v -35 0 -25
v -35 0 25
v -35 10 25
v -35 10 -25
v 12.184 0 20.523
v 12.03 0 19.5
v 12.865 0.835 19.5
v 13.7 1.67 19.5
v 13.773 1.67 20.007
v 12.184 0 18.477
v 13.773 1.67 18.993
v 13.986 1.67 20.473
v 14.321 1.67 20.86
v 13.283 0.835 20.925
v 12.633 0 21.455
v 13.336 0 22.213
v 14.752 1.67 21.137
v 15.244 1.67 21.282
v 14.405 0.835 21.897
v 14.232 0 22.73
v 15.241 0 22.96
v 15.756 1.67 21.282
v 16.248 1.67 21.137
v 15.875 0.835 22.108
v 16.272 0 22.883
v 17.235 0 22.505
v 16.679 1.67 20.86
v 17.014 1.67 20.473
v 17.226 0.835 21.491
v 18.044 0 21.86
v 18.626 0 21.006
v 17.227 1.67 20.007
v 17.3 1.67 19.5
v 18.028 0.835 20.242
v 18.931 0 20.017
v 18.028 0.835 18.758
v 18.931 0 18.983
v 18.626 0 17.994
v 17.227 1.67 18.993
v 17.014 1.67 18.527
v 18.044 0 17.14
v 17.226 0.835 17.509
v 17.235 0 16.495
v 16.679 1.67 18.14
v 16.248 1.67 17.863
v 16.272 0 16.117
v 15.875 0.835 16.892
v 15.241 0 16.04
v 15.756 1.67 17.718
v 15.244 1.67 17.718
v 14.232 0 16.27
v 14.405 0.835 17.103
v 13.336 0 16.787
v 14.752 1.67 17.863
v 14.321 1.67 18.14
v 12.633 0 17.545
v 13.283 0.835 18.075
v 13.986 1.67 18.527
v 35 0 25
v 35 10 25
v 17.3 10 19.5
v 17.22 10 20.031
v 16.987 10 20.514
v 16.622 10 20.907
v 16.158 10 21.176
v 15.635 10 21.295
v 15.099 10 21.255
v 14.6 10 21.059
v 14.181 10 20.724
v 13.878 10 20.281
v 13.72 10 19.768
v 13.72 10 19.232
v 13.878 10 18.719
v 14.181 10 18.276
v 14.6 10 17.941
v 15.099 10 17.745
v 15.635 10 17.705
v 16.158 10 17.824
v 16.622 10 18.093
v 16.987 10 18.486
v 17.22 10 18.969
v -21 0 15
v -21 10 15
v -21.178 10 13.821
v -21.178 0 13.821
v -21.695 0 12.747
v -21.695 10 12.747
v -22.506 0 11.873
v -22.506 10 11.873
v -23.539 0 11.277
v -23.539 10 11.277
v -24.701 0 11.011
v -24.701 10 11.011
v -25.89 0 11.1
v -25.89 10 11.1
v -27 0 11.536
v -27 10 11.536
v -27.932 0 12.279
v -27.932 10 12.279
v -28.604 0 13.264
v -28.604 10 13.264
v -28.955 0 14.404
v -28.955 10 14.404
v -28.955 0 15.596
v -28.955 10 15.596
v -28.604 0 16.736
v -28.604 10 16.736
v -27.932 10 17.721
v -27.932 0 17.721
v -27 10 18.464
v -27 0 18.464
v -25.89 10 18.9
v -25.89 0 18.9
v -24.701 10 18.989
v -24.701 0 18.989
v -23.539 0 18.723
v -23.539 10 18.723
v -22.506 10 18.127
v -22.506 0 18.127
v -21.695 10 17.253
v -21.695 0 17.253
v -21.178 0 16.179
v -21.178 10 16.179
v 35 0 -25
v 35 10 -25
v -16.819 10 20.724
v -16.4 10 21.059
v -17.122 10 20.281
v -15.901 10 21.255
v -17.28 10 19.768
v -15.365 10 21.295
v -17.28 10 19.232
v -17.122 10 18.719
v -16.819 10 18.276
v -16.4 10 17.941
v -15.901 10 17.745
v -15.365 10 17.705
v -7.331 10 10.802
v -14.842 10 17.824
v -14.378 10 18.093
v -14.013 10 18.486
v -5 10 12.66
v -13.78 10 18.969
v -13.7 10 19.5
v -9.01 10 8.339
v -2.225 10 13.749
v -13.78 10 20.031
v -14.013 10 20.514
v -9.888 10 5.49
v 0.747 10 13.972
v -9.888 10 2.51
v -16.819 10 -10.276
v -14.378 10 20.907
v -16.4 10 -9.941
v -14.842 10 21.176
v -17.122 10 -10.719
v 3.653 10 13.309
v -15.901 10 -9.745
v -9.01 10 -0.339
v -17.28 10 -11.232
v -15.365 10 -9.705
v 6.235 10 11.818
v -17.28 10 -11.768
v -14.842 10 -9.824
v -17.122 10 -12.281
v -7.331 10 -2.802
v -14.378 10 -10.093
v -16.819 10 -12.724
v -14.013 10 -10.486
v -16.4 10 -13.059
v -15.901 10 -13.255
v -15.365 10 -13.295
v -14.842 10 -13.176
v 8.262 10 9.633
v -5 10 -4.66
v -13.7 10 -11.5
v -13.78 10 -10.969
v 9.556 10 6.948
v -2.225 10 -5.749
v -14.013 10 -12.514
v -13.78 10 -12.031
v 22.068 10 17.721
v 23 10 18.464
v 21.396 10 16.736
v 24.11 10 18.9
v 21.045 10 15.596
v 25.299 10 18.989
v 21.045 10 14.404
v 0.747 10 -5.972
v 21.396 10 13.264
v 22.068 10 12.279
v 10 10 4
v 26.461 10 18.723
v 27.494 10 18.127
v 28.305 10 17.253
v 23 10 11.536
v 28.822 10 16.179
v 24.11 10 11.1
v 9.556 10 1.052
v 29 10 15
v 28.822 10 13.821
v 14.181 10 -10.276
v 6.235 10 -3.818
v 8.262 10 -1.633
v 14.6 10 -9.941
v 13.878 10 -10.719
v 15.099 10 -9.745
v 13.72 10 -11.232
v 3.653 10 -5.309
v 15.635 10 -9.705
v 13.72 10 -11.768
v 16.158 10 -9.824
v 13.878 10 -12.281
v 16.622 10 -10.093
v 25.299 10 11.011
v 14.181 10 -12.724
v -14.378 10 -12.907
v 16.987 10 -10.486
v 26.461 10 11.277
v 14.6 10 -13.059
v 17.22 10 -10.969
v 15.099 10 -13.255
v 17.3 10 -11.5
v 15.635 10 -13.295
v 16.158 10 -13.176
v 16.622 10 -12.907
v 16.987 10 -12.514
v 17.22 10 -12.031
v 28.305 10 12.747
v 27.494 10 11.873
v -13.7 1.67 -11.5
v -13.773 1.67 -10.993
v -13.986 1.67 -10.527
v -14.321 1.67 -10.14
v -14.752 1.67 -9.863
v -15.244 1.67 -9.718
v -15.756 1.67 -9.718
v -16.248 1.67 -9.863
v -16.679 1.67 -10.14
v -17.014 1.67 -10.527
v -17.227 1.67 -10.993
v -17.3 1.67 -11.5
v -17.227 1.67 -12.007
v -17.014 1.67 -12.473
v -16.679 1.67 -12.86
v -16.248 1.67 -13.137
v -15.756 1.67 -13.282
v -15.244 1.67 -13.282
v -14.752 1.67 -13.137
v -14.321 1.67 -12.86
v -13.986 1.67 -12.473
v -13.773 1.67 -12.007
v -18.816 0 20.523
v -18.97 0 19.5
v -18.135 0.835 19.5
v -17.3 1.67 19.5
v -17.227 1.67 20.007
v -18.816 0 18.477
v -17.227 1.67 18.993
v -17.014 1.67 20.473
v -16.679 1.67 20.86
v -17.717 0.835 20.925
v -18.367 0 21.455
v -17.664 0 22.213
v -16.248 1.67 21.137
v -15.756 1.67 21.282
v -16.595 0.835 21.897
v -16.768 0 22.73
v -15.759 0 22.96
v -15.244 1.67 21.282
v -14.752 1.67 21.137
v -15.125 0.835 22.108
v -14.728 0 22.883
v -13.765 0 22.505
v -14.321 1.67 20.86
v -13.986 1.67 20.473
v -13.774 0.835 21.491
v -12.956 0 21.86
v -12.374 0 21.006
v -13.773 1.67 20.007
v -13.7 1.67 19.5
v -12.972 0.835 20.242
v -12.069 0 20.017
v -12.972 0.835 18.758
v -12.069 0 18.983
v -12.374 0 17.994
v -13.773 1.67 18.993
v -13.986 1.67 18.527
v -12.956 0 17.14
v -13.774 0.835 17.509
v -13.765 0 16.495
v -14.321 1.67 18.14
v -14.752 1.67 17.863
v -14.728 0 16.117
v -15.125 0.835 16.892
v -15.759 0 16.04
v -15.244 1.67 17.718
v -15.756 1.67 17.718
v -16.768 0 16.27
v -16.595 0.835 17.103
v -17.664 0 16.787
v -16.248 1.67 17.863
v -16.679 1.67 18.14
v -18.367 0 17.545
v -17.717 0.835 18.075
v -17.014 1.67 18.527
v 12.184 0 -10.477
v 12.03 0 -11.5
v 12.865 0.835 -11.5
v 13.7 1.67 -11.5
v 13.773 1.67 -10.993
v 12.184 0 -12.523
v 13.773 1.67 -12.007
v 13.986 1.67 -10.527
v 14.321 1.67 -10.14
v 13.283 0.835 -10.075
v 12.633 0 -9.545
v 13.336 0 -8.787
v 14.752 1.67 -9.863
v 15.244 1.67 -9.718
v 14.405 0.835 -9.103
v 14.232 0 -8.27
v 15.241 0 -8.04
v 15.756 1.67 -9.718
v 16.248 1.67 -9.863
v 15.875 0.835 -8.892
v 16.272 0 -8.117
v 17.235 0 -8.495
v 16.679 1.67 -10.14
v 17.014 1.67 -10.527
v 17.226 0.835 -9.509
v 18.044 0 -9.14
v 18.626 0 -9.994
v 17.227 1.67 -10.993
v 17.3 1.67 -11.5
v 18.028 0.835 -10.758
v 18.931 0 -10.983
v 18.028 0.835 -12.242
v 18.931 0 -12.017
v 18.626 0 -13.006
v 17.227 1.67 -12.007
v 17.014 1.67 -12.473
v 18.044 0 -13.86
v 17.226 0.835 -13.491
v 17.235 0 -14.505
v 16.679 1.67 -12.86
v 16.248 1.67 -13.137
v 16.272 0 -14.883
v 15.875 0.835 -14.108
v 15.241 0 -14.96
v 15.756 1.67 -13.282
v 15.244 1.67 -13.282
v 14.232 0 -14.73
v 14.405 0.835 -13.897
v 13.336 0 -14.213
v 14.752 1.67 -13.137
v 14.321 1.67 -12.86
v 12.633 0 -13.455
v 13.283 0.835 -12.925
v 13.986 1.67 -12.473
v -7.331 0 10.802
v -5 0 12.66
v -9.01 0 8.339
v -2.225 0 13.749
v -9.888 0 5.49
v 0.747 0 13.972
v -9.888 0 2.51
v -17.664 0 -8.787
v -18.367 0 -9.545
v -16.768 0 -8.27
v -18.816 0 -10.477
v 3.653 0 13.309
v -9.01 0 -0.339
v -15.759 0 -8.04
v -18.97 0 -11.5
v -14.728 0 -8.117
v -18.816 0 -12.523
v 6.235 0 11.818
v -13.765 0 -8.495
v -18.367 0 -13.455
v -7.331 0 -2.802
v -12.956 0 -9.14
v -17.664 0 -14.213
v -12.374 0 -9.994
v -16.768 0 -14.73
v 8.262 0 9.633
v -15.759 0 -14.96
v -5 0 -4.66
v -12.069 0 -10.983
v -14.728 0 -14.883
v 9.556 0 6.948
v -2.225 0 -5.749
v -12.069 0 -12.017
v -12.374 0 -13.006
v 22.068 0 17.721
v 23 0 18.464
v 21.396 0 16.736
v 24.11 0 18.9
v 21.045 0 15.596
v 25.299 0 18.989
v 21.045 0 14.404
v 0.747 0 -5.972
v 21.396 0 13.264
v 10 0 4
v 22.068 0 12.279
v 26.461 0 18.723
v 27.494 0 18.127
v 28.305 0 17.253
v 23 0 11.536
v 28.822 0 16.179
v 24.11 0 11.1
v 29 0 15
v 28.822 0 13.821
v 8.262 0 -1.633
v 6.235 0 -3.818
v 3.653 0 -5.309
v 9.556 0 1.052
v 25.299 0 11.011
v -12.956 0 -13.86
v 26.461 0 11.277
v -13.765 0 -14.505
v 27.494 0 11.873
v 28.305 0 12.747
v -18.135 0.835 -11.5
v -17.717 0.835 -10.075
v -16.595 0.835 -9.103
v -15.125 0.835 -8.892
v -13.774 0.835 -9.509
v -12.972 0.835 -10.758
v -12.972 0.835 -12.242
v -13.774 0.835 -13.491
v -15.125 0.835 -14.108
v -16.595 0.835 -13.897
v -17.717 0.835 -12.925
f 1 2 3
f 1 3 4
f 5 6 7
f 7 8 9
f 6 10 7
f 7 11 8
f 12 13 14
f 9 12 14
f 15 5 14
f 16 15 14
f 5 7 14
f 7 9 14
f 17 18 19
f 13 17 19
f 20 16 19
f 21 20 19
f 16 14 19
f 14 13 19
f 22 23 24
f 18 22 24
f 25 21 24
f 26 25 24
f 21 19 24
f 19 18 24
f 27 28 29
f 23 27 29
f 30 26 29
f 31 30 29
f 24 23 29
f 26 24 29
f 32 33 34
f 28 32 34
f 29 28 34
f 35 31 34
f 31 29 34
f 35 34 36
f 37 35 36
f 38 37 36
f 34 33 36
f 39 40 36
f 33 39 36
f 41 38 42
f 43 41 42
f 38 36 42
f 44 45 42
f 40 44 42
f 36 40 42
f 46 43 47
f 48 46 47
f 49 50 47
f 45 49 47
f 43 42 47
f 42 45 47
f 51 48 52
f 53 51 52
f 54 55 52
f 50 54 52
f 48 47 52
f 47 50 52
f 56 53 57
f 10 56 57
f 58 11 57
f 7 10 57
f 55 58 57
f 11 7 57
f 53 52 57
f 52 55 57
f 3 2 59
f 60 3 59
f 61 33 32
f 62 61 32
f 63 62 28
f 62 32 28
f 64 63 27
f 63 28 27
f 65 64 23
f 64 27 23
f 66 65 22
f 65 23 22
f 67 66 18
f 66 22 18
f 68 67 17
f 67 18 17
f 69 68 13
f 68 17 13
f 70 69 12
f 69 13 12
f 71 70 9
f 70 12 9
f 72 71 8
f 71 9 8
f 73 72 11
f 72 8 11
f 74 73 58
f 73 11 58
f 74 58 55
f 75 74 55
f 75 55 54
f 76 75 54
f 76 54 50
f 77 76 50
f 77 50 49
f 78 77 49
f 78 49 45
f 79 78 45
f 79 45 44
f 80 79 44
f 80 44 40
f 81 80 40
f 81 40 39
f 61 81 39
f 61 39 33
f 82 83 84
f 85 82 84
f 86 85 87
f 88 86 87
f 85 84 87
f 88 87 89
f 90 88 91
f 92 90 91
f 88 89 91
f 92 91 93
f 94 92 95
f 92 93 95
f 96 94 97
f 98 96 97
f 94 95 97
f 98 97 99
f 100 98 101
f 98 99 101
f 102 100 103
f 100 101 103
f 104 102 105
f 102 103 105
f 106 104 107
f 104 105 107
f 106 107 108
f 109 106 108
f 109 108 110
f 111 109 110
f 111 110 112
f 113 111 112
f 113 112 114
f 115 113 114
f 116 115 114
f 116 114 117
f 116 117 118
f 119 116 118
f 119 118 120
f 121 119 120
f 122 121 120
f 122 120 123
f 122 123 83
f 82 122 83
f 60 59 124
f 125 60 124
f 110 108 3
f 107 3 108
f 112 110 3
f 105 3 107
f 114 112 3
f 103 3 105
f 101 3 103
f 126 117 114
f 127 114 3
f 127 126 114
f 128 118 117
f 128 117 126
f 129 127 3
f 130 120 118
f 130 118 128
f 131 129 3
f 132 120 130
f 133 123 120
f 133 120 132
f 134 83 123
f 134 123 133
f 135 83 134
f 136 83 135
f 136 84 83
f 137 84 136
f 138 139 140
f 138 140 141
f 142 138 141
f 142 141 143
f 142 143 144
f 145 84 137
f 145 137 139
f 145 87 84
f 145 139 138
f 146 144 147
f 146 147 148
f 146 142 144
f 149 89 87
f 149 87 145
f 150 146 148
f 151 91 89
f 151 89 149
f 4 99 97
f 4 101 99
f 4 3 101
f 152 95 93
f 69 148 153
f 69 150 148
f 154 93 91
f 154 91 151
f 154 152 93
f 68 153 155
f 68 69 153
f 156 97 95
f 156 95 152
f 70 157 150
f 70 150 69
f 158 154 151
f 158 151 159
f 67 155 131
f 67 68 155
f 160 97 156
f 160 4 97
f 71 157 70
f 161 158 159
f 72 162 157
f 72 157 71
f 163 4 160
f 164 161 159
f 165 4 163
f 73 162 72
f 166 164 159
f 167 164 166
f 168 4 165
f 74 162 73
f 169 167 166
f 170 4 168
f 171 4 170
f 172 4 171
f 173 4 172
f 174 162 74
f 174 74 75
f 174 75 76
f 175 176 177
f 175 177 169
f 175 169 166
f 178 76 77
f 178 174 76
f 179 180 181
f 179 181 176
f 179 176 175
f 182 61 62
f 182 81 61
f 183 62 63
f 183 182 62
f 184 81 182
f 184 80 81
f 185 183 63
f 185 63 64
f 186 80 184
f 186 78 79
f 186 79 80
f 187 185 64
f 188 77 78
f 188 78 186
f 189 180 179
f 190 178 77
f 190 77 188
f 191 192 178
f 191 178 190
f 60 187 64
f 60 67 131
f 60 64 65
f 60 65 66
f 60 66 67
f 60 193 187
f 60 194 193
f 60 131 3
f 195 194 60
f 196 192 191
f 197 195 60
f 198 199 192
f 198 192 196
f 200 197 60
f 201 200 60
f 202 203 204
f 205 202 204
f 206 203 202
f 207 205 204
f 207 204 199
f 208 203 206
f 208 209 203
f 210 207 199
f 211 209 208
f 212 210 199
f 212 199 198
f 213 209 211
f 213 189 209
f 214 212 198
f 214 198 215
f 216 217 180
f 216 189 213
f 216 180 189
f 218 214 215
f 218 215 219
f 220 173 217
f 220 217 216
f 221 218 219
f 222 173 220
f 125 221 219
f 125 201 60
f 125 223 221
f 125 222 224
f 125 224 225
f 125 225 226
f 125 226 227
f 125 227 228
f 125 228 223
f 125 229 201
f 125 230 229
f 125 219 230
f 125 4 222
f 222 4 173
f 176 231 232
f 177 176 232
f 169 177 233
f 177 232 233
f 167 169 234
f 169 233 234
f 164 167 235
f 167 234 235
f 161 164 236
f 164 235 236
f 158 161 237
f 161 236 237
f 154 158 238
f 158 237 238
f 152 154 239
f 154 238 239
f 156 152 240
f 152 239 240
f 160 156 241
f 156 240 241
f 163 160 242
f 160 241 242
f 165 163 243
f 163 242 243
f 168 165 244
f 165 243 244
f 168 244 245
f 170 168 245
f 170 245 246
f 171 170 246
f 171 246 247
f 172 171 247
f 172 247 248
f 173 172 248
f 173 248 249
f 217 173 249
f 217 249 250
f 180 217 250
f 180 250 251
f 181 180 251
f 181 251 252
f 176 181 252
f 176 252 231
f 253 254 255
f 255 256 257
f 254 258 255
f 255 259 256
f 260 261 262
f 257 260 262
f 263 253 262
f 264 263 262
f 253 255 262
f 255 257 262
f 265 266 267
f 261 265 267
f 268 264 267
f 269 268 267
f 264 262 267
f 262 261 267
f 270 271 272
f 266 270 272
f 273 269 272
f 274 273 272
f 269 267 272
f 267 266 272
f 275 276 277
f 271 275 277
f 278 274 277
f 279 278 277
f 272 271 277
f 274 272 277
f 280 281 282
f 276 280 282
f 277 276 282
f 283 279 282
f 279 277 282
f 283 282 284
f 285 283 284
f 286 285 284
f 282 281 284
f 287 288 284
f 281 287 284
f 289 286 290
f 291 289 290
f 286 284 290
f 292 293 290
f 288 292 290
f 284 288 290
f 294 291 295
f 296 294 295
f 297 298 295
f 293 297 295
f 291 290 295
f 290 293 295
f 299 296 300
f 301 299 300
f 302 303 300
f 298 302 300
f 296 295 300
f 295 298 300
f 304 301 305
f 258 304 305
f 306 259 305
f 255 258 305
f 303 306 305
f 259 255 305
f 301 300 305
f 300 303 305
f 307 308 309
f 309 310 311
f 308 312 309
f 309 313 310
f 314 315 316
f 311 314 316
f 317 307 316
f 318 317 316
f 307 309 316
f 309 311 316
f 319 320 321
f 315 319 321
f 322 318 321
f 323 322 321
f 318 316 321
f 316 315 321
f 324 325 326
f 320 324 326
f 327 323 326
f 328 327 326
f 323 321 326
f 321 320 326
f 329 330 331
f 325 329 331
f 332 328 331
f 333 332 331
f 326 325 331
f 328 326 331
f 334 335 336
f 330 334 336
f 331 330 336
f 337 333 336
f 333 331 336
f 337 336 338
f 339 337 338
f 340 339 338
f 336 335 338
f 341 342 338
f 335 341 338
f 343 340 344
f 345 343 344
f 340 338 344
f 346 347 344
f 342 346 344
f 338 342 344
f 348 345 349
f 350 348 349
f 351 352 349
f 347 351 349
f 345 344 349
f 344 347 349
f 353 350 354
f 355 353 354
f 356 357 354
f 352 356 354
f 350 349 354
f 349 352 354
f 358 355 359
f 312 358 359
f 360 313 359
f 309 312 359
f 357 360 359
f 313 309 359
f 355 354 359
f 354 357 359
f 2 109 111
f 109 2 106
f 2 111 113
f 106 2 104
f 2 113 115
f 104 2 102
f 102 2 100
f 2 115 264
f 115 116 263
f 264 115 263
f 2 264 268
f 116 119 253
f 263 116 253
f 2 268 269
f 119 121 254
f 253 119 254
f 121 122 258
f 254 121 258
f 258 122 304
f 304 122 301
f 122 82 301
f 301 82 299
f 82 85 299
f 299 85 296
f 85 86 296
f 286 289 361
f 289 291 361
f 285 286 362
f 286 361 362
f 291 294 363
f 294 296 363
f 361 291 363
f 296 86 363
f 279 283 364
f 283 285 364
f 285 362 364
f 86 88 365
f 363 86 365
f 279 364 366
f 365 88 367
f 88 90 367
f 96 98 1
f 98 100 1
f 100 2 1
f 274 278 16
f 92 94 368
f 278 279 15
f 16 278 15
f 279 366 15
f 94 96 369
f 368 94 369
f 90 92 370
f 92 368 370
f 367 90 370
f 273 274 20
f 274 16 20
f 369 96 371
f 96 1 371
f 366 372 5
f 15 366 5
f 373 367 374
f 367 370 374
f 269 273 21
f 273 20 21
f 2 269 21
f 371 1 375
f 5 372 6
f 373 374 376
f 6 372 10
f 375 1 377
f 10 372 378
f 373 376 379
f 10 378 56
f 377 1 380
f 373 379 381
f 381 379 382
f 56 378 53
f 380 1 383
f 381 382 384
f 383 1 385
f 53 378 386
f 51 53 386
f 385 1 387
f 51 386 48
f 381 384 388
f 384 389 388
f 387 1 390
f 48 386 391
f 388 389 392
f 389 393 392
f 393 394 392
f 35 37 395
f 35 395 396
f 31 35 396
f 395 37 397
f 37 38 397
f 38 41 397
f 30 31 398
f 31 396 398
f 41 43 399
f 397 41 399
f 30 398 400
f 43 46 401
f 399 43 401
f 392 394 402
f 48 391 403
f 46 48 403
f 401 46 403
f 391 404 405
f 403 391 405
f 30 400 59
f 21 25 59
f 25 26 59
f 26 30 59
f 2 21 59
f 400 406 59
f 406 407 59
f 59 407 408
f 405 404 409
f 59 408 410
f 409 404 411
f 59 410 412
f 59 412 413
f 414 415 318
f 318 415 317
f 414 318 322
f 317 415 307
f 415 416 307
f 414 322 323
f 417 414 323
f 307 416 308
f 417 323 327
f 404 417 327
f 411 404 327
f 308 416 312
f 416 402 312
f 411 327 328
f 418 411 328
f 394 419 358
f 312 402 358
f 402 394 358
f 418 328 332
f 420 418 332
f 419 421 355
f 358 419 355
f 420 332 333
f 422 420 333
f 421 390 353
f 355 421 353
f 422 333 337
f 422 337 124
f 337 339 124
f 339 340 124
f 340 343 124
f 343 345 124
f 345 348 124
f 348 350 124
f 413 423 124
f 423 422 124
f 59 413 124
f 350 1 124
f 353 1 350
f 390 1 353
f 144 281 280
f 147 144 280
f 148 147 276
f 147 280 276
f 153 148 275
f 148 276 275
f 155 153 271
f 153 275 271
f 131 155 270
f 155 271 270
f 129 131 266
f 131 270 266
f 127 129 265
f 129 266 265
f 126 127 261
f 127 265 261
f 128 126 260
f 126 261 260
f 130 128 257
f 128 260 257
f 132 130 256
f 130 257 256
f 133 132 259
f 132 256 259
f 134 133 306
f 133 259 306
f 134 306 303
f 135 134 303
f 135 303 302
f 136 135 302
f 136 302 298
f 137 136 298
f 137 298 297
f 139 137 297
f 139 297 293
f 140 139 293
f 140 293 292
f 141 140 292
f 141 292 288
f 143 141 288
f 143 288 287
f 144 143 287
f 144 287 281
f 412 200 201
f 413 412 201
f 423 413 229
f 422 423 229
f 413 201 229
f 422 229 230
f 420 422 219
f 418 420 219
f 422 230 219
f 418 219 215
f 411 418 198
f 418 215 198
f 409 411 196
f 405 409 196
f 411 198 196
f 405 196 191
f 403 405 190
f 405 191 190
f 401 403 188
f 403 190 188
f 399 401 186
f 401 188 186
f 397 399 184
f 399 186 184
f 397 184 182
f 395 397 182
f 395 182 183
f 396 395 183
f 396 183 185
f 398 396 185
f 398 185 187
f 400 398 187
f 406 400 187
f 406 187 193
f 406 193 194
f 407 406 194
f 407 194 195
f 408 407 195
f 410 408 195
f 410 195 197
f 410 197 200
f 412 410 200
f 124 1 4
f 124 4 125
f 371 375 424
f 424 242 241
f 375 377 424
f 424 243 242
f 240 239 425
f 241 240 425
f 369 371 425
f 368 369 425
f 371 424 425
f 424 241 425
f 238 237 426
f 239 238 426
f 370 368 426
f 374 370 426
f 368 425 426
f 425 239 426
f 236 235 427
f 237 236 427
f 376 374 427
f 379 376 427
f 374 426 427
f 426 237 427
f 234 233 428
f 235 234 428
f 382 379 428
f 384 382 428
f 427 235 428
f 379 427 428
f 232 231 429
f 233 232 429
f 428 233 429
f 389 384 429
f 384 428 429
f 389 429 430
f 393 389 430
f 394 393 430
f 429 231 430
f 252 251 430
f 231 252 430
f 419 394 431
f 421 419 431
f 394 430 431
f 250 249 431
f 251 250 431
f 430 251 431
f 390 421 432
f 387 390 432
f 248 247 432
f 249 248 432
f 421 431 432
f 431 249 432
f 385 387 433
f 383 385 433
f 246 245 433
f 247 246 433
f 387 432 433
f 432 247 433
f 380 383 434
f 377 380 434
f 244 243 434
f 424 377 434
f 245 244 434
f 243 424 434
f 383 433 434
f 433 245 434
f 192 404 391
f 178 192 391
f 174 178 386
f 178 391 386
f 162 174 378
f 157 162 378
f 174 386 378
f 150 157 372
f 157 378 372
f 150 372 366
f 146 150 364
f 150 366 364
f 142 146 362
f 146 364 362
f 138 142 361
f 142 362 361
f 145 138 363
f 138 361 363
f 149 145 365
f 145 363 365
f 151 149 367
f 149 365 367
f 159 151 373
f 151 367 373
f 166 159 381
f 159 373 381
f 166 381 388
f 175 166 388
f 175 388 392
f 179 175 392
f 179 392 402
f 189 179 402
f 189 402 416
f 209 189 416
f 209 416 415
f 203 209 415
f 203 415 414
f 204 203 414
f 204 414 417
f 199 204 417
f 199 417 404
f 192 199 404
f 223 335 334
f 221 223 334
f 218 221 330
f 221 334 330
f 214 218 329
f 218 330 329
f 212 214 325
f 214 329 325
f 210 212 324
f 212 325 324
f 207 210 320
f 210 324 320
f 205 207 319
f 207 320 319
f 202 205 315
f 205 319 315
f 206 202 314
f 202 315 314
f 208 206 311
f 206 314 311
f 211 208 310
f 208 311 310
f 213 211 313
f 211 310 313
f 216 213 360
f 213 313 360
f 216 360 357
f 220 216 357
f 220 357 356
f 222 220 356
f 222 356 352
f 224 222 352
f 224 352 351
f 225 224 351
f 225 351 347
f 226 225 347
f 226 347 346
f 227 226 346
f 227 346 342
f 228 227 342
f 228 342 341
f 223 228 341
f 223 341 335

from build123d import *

# Parameters (mm, degrees)
SKETCH2_W                                            = 70
SKETCH2_H                                            = 50
BOSS_EXTRUDE1_DEPTH                                  = 10
SKETCH3_R                                            = 4
CUT_EXTRUDE1_DEPTH                                   = 11
SKETCH4_R                                            = 1.8
CUT_EXTRUDE2_DEPTH                                   = 11
SKETCH5_R                                            = 10
CUT_EXTRUDE3_DEPTH                                   = 11
CSK_FOR_M3_SOCKET_COUNTERSUNK_HEAD_SCREW_D           = 3.4
CSK_FOR_M3_SOCKET_COUNTERSUNK_HEAD_SCREW_CSINK_D     = 6.94
CSK_FOR_M3_SOCKET_COUNTERSUNK_HEAD_SCREW_CSINK_ANGLE = 90


with BuildPart() as part:
    # Sketch2 → Boss-Extrude1 (new body)
    with BuildSketch(Plane(origin=(0, 0, 0), x_dir=(1, 0, 0), z_dir=(0, 1, 0))):
        Rectangle(SKETCH2_W, SKETCH2_H)
    extrude(amount=BOSS_EXTRUDE1_DEPTH)

    # Sketch3 → Cut-Extrude1 (cut, through all)
    with BuildSketch(Plane(origin=(0, 10, 0), x_dir=(1, 0, 0), z_dir=(0, 1, 0))):
        with Locations((-25, -15)):
            Circle(SKETCH3_R)
        with Locations((25, -15)):
            Circle(SKETCH3_R)
    extrude(amount=-CUT_EXTRUDE1_DEPTH, mode=Mode.SUBTRACT)

    # Sketch4 → Cut-Extrude2 (cut, through all)
    with BuildSketch(Plane.XZ):
        with Locations((-15.5, 19.5)):
            Circle(SKETCH4_R)
        with Locations((-15.5, -11.5)):
            Circle(SKETCH4_R)
        with Locations((15.5, -11.5)):
            Circle(SKETCH4_R)
        with Locations((15.5, 19.5)):
            Circle(SKETCH4_R)
    extrude(amount=-CUT_EXTRUDE2_DEPTH, mode=Mode.SUBTRACT)

    # Sketch5 → Cut-Extrude3 (cut, through all)
    with BuildSketch(Plane.XZ):
        with Locations((0, 4)):
            Circle(SKETCH5_R)
    extrude(amount=-CUT_EXTRUDE3_DEPTH, mode=Mode.SUBTRACT)

    # CSK for M3 socket countersunk head screw (through all)
    with Locations(Plane.XZ):
        with Locations((-15.5, 19.5), (15.5, 19.5), (15.5, -11.5), (-15.5, -11.5)):
            CounterSinkHole(CSK_FOR_M3_SOCKET_COUNTERSUNK_HEAD_SCREW_D / 2, CSK_FOR_M3_SOCKET_COUNTERSUNK_HEAD_SCREW_CSINK_D / 2, counter_sink_angle=CSK_FOR_M3_SOCKET_COUNTERSUNK_HEAD_SCREW_CSINK_ANGLE)


solid = part.part
